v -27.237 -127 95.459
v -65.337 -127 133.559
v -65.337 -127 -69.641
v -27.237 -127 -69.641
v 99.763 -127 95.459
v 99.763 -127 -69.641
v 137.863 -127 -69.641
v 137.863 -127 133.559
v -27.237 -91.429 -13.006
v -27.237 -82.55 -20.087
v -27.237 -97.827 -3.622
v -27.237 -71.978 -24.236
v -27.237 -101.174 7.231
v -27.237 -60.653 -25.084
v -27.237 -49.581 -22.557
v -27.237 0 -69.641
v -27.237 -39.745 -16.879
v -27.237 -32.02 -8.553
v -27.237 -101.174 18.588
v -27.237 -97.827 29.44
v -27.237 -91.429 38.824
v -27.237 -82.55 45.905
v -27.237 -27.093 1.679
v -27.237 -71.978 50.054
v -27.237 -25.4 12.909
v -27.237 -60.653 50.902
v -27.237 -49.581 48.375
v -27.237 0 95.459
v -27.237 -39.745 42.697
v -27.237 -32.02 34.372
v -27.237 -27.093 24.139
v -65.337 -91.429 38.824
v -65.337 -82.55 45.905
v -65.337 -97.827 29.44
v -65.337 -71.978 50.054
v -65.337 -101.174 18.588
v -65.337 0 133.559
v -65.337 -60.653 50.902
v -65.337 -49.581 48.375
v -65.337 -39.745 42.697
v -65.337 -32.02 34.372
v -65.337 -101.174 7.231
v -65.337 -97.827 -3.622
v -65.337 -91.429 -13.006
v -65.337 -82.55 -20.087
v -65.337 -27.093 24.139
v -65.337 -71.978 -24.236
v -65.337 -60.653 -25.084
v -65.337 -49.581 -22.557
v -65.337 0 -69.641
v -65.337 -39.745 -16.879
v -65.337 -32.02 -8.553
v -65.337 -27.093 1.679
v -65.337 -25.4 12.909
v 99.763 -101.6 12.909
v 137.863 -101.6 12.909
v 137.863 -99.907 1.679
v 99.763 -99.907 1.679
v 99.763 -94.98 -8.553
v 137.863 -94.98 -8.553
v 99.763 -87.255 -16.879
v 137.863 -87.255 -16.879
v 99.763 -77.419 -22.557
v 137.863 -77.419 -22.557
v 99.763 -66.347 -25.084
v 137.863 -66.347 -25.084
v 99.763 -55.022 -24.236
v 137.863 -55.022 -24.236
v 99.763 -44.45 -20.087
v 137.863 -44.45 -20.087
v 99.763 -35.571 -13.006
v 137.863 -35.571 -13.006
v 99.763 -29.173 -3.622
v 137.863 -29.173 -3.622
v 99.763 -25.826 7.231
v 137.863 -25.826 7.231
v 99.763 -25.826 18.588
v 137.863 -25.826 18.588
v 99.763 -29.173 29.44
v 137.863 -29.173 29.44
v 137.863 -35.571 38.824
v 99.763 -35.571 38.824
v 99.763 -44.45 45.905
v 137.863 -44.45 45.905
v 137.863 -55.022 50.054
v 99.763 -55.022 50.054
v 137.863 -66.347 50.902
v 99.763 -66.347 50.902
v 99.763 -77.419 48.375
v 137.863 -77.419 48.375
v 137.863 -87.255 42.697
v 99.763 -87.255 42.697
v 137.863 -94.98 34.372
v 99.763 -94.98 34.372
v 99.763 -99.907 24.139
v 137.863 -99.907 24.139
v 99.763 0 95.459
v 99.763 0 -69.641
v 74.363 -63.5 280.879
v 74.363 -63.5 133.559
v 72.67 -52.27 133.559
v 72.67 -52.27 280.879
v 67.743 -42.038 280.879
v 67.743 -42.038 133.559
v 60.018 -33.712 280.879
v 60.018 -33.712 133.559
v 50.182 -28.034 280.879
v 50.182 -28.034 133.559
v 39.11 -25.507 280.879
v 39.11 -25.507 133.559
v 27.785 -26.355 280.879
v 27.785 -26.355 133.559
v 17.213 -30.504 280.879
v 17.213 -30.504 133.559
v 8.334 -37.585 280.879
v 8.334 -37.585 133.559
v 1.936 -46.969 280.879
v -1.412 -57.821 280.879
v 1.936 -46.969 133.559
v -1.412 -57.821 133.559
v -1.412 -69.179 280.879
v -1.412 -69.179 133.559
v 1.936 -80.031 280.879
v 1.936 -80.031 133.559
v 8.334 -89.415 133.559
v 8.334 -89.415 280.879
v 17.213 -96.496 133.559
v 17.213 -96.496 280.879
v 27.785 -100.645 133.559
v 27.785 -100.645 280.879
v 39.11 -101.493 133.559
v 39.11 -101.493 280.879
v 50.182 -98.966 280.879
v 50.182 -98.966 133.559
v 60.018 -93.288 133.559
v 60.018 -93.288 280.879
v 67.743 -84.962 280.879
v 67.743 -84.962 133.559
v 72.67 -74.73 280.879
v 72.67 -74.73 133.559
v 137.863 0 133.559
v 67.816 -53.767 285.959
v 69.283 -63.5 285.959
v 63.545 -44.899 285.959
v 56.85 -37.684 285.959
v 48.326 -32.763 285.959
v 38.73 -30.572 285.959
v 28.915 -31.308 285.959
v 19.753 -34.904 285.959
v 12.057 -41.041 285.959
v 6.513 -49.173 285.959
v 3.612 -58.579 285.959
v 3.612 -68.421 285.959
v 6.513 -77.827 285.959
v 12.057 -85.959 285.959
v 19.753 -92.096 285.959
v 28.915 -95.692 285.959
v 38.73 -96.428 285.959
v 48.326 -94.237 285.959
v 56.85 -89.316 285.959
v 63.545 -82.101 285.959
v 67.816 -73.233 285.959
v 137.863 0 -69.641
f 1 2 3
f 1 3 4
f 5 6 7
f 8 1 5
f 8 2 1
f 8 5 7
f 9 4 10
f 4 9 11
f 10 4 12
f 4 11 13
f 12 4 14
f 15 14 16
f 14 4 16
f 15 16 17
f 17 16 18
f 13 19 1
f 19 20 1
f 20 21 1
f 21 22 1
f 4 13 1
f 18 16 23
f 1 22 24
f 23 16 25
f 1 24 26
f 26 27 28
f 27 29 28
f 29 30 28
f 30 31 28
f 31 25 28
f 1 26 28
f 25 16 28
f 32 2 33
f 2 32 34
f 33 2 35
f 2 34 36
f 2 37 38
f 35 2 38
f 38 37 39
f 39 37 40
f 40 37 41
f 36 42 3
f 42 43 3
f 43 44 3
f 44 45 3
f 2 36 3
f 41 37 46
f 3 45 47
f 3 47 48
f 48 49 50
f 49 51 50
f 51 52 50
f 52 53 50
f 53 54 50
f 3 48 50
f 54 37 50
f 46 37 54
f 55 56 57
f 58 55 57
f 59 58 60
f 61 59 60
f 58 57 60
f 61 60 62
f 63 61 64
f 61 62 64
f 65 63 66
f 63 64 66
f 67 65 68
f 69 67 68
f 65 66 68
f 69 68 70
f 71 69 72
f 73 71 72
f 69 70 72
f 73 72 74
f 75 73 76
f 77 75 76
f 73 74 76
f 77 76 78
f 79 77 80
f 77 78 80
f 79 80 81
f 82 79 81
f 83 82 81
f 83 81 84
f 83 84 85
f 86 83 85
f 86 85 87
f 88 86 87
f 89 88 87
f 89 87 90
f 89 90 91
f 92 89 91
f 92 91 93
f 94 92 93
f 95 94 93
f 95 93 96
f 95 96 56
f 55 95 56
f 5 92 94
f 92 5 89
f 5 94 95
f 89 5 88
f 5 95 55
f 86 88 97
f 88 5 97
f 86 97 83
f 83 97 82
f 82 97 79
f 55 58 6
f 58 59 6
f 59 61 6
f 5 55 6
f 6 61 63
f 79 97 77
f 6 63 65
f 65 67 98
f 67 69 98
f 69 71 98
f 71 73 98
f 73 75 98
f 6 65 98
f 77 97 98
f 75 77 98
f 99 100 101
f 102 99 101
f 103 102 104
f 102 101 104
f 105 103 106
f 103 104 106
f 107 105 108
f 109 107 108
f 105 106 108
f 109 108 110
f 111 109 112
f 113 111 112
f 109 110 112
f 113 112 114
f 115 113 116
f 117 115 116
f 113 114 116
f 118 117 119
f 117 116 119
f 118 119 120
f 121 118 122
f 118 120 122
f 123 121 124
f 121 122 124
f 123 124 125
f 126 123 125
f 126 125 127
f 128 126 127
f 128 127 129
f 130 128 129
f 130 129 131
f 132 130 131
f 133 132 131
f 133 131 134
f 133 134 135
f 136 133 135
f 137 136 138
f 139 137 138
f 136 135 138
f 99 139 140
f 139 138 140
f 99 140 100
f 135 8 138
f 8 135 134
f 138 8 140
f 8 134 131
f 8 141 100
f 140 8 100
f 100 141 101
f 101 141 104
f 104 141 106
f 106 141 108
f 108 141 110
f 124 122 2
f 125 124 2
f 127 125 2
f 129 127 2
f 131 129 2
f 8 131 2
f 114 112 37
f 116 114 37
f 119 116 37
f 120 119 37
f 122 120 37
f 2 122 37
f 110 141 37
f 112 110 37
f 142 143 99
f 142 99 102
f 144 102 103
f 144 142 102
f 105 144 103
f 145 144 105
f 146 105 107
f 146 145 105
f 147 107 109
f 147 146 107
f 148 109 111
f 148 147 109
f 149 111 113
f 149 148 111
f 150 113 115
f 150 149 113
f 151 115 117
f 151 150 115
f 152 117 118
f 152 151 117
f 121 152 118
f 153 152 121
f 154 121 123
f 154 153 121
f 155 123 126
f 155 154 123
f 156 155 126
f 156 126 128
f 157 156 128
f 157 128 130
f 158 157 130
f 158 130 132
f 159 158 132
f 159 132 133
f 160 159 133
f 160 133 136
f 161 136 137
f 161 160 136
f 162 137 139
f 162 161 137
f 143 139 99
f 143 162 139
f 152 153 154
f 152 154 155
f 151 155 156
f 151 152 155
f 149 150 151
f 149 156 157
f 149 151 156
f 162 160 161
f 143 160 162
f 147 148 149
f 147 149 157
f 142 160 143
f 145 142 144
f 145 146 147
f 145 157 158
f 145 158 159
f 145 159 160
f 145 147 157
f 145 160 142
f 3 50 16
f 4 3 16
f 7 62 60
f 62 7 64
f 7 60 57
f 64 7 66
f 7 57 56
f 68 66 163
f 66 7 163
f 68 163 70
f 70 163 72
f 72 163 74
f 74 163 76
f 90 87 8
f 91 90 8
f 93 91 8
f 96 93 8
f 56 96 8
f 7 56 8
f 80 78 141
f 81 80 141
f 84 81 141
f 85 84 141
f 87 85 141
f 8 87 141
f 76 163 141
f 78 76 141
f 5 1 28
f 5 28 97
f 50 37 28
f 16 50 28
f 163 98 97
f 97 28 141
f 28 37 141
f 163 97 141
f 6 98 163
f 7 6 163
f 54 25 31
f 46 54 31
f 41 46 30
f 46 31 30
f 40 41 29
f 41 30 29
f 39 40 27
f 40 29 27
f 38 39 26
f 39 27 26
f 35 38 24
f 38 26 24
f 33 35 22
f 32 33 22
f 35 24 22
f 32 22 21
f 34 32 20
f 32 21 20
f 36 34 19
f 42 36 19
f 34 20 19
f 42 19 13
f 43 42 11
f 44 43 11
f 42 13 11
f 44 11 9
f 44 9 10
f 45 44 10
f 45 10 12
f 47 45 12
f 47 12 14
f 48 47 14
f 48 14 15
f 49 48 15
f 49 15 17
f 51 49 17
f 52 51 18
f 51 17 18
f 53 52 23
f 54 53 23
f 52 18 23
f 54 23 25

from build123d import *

# Parameters (mm, degrees)
F0_W     = 63.5
F0_H     = 38.1
F1_DEPTH = 127
F2_R     = 38.1
F3_DEPTH = 152.4
F4_SIZE  = 5.08
F6_D     = 76.2
F6_DEPTH = 38.101
F7_D     = 76.2


with BuildPart() as f1:
    # F0 (on Front) → F1 (new body)
    with BuildSketch(Plane.XZ):
        Polygon((137.8628114581, 133.5590133786), (99.7628114581, 133.5590133786), (99.7628114581, 95.4590133786), (99.7628114581, -69.6409866214), (137.8628114581, -69.6409866214), align=None)
        with Locations((68.0128114581, 114.5090133786)):
            Rectangle(F0_W, F0_H)
        with Locations((4.5128114581, 114.5090133786)):
            Rectangle(F0_W, F0_H)
        Polygon((-27.2371885419, 95.4590133786), (-27.2371885419, 133.5590133786), (-65.3371885419, 133.5590133786), (-65.3371885419, -69.6409866214), (-27.2371885419, -69.6409866214), align=None)
    extrude(amount=F1_DEPTH)

    # F2 (on face) → F3 (join)
    with BuildSketch(Plane.XY.offset(133.5590133786)):
        with Locations((36.2628114581, -63.5)):
            Circle(F2_R)
    extrude(amount=F3_DEPTH)

    # F4
    f4_edges = [f1.edges().sort_by_distance(p)[0] for p in [
        (-1.837189, -63.5, 285.959013),
    ]]
    chamfer(f4_edges, length=F4_SIZE)

    # F6 (through all, one way)
    with BuildSketch(Plane.YZ.offset(-27.2371885419)):
        with Locations((-63.5, 12.9090133786)):
            Circle(F6_D / 2)
    extrude(amount=-F6_DEPTH, mode=Mode.SUBTRACT)

    # F7 (through all)
    with Locations(Plane(origin=(-27.2371885419, 0, 0), x_dir=(0, 1, 0), z_dir=(-1, 0, 0))):
        with Locations((-63.5, -12.9090133786)):
            Hole(F7_D / 2)


solid = f1.part
